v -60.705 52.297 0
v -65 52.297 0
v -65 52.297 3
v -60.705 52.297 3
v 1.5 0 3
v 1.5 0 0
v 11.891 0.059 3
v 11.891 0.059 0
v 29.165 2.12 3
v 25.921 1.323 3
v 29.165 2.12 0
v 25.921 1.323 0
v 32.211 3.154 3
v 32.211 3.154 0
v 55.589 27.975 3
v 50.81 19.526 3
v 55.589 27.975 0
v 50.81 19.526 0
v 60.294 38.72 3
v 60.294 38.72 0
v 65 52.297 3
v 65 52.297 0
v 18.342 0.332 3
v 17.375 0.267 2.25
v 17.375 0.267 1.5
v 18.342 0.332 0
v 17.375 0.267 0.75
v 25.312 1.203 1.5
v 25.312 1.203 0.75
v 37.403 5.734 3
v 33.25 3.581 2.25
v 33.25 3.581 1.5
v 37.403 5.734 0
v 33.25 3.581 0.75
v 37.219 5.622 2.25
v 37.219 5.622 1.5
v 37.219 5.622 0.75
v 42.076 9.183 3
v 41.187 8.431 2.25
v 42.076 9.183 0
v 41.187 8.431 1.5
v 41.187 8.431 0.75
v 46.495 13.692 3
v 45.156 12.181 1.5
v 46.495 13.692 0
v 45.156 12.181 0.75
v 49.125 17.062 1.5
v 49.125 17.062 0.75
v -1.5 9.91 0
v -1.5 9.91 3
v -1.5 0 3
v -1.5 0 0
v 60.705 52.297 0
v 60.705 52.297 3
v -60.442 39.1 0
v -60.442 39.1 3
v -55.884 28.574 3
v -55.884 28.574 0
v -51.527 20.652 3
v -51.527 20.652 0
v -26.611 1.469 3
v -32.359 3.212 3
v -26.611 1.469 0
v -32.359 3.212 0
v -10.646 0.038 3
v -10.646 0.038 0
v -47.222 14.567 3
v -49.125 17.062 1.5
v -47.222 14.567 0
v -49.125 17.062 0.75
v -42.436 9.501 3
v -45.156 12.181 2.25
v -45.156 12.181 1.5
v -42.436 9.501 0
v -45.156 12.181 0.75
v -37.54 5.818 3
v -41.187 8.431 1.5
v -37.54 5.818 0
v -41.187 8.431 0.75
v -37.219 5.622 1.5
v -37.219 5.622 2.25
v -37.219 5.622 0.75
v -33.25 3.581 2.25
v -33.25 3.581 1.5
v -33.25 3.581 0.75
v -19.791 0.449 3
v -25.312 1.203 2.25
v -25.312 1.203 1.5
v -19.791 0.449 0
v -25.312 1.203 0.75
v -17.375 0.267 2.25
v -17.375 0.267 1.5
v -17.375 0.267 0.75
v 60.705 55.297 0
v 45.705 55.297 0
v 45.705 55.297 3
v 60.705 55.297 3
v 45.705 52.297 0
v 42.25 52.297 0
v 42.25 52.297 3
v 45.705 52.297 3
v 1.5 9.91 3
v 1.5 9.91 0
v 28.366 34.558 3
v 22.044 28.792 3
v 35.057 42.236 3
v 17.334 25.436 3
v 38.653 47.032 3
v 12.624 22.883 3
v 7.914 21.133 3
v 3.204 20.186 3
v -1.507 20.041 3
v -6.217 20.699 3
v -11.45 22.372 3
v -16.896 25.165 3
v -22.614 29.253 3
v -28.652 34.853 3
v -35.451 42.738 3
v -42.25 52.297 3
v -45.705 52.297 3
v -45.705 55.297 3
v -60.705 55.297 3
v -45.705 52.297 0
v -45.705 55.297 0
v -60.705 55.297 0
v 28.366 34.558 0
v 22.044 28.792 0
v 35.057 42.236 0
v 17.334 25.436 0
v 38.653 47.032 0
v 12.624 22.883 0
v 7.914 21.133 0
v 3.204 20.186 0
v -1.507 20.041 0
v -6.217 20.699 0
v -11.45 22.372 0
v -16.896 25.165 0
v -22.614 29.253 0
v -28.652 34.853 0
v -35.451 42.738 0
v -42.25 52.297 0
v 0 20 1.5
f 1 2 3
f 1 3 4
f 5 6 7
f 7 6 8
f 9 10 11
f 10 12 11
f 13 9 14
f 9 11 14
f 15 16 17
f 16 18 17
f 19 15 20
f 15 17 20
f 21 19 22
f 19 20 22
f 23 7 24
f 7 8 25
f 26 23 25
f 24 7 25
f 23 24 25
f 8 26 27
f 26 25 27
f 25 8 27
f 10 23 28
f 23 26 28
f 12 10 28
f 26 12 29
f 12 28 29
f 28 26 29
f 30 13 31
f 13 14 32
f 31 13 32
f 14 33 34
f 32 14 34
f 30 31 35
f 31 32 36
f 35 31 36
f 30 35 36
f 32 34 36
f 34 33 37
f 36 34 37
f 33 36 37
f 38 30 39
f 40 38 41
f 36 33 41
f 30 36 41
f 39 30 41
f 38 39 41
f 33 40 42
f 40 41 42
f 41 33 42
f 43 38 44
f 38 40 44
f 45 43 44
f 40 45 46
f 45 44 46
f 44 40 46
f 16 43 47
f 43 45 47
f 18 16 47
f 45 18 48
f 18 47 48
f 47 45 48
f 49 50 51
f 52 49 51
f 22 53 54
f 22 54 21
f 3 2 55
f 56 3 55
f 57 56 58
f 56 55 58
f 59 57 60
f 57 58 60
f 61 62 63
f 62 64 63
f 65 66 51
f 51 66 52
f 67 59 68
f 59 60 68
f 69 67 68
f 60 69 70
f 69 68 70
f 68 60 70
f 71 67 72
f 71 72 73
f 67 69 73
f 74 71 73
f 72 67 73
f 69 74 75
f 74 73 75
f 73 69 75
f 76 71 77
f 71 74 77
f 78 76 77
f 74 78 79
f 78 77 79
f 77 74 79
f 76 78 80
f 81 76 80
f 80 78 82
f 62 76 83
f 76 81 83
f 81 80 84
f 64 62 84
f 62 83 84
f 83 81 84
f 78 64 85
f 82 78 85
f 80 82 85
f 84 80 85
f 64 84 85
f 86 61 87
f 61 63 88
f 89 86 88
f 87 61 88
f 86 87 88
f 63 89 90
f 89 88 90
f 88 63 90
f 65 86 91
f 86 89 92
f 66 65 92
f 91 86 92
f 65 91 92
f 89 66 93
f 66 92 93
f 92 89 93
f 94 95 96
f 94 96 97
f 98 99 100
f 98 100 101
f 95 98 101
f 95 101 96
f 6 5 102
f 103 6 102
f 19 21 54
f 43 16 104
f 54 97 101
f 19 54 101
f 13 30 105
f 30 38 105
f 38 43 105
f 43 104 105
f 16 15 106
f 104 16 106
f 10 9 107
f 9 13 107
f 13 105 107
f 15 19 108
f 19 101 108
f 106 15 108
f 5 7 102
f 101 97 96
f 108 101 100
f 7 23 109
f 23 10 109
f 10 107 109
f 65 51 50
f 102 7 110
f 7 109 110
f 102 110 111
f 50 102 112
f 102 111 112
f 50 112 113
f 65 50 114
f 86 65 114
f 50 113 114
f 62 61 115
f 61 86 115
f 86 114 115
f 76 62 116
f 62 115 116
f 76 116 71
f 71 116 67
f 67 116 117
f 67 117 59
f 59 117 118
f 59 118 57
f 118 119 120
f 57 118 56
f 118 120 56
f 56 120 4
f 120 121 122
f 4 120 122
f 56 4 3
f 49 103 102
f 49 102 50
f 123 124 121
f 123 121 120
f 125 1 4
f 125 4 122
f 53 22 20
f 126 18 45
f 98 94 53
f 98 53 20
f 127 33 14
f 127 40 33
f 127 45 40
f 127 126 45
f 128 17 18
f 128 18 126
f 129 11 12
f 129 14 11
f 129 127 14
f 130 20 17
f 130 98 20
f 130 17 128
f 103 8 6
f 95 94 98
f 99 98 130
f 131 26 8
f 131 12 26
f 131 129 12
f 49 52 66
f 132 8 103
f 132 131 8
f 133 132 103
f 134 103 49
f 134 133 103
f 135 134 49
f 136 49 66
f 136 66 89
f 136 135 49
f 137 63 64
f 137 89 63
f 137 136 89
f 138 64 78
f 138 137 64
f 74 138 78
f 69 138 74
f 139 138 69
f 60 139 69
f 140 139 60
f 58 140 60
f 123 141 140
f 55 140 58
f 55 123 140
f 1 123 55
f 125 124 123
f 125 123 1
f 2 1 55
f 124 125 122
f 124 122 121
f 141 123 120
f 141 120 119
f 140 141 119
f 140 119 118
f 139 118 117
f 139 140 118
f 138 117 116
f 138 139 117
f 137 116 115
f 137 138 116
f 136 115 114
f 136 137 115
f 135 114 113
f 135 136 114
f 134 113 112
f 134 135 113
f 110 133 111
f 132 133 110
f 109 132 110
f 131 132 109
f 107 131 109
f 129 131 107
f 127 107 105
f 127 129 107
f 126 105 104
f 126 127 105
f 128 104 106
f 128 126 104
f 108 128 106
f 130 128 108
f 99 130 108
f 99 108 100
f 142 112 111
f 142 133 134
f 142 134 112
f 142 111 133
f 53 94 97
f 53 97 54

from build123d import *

# Parameters (mm, degrees)
EXTRUDE_1_DEPTH     = 3
CUT_EXTRUDE_4_DEPTH = 10
SKETCH_6_W          = 3
SKETCH_6_H          = 0.29
EXTRUDE_4_DEPTH     = 3


with BuildPart() as part:
    # 草图1 → 凸台-拉伸1 (new body)
    with BuildSketch(Plane.XY):
        with BuildLine():
            Line((-64.999999986, 52.296752884), (-60.705196958, 52.296752884))
            Line((-60.705196958, 52.296752884), (-60.705196958, 55.296750271))
            Line((-60.705196958, 55.296750271), (-45.705196958, 55.296750271))
            Line((-45.705196958, 55.296750271), (-45.705196958, 52.296752929))
            Line((-45.705196958, 52.296752929), (-42.249528739, 52.296752929))
            add(Edge.make_bspline(
                [(-42.249528739, 52.296752929), (0, -12.296752929), (42.249528739, 52.296752929)],
                knots=[0, 0, 0, 1, 1, 1], degree=2))
            Line((42.249528739, 52.296752929), (45.705196958, 52.296752929))
            Line((45.705196958, 52.296752929), (45.705196958, 55.296750271))
            Line((45.705196958, 55.296750271), (60.705196958, 55.296750271))
            Line((60.705196958, 55.296750271), (60.705196958, 52.296752884))
            Line((60.705196958, 52.296752884), (64.999999986, 52.296752884))
            add(Edge.make_bspline(
                [(-64.999999986, 52.296752884), (-32.499999991, -52.296752885), (0, 52.296752883), (32.499999995, -52.296752882), (64.999999986, 52.296752884)],
                knots=[0.035680117, 0.035680117, 0.035680117, 0.035680117, 0.035680117, 0.964319883, 0.964319883, 0.964319883, 0.964319883, 0.964319883], degree=4))
        make_face()
    extrude(amount=EXTRUDE_1_DEPTH)

    # 草图4 → 切除-拉伸4 (cut)
    with BuildSketch(Plane.XY.offset(3)):
        Polygon((-1.5, 1.4832e-05), (-1.5, -2.686062371), (1.5, -2.686062371), (1.5, 0.000504044), (1.5, 10.2), (-1.5, 10.2), align=None)
    extrude(amount=-CUT_EXTRUDE_4_DEPTH, mode=Mode.SUBTRACT)

    # 草图6 → 凸台-拉伸4 (add)
    with BuildSketch(Plane(origin=(0, 0, 0), x_dir=(-1, 0, 0), z_dir=(0, 0, -1))):
        with Locations((0, 10.055)):
            Rectangle(SKETCH_6_W, SKETCH_6_H)
    extrude(amount=-EXTRUDE_4_DEPTH)


solid = part.part
